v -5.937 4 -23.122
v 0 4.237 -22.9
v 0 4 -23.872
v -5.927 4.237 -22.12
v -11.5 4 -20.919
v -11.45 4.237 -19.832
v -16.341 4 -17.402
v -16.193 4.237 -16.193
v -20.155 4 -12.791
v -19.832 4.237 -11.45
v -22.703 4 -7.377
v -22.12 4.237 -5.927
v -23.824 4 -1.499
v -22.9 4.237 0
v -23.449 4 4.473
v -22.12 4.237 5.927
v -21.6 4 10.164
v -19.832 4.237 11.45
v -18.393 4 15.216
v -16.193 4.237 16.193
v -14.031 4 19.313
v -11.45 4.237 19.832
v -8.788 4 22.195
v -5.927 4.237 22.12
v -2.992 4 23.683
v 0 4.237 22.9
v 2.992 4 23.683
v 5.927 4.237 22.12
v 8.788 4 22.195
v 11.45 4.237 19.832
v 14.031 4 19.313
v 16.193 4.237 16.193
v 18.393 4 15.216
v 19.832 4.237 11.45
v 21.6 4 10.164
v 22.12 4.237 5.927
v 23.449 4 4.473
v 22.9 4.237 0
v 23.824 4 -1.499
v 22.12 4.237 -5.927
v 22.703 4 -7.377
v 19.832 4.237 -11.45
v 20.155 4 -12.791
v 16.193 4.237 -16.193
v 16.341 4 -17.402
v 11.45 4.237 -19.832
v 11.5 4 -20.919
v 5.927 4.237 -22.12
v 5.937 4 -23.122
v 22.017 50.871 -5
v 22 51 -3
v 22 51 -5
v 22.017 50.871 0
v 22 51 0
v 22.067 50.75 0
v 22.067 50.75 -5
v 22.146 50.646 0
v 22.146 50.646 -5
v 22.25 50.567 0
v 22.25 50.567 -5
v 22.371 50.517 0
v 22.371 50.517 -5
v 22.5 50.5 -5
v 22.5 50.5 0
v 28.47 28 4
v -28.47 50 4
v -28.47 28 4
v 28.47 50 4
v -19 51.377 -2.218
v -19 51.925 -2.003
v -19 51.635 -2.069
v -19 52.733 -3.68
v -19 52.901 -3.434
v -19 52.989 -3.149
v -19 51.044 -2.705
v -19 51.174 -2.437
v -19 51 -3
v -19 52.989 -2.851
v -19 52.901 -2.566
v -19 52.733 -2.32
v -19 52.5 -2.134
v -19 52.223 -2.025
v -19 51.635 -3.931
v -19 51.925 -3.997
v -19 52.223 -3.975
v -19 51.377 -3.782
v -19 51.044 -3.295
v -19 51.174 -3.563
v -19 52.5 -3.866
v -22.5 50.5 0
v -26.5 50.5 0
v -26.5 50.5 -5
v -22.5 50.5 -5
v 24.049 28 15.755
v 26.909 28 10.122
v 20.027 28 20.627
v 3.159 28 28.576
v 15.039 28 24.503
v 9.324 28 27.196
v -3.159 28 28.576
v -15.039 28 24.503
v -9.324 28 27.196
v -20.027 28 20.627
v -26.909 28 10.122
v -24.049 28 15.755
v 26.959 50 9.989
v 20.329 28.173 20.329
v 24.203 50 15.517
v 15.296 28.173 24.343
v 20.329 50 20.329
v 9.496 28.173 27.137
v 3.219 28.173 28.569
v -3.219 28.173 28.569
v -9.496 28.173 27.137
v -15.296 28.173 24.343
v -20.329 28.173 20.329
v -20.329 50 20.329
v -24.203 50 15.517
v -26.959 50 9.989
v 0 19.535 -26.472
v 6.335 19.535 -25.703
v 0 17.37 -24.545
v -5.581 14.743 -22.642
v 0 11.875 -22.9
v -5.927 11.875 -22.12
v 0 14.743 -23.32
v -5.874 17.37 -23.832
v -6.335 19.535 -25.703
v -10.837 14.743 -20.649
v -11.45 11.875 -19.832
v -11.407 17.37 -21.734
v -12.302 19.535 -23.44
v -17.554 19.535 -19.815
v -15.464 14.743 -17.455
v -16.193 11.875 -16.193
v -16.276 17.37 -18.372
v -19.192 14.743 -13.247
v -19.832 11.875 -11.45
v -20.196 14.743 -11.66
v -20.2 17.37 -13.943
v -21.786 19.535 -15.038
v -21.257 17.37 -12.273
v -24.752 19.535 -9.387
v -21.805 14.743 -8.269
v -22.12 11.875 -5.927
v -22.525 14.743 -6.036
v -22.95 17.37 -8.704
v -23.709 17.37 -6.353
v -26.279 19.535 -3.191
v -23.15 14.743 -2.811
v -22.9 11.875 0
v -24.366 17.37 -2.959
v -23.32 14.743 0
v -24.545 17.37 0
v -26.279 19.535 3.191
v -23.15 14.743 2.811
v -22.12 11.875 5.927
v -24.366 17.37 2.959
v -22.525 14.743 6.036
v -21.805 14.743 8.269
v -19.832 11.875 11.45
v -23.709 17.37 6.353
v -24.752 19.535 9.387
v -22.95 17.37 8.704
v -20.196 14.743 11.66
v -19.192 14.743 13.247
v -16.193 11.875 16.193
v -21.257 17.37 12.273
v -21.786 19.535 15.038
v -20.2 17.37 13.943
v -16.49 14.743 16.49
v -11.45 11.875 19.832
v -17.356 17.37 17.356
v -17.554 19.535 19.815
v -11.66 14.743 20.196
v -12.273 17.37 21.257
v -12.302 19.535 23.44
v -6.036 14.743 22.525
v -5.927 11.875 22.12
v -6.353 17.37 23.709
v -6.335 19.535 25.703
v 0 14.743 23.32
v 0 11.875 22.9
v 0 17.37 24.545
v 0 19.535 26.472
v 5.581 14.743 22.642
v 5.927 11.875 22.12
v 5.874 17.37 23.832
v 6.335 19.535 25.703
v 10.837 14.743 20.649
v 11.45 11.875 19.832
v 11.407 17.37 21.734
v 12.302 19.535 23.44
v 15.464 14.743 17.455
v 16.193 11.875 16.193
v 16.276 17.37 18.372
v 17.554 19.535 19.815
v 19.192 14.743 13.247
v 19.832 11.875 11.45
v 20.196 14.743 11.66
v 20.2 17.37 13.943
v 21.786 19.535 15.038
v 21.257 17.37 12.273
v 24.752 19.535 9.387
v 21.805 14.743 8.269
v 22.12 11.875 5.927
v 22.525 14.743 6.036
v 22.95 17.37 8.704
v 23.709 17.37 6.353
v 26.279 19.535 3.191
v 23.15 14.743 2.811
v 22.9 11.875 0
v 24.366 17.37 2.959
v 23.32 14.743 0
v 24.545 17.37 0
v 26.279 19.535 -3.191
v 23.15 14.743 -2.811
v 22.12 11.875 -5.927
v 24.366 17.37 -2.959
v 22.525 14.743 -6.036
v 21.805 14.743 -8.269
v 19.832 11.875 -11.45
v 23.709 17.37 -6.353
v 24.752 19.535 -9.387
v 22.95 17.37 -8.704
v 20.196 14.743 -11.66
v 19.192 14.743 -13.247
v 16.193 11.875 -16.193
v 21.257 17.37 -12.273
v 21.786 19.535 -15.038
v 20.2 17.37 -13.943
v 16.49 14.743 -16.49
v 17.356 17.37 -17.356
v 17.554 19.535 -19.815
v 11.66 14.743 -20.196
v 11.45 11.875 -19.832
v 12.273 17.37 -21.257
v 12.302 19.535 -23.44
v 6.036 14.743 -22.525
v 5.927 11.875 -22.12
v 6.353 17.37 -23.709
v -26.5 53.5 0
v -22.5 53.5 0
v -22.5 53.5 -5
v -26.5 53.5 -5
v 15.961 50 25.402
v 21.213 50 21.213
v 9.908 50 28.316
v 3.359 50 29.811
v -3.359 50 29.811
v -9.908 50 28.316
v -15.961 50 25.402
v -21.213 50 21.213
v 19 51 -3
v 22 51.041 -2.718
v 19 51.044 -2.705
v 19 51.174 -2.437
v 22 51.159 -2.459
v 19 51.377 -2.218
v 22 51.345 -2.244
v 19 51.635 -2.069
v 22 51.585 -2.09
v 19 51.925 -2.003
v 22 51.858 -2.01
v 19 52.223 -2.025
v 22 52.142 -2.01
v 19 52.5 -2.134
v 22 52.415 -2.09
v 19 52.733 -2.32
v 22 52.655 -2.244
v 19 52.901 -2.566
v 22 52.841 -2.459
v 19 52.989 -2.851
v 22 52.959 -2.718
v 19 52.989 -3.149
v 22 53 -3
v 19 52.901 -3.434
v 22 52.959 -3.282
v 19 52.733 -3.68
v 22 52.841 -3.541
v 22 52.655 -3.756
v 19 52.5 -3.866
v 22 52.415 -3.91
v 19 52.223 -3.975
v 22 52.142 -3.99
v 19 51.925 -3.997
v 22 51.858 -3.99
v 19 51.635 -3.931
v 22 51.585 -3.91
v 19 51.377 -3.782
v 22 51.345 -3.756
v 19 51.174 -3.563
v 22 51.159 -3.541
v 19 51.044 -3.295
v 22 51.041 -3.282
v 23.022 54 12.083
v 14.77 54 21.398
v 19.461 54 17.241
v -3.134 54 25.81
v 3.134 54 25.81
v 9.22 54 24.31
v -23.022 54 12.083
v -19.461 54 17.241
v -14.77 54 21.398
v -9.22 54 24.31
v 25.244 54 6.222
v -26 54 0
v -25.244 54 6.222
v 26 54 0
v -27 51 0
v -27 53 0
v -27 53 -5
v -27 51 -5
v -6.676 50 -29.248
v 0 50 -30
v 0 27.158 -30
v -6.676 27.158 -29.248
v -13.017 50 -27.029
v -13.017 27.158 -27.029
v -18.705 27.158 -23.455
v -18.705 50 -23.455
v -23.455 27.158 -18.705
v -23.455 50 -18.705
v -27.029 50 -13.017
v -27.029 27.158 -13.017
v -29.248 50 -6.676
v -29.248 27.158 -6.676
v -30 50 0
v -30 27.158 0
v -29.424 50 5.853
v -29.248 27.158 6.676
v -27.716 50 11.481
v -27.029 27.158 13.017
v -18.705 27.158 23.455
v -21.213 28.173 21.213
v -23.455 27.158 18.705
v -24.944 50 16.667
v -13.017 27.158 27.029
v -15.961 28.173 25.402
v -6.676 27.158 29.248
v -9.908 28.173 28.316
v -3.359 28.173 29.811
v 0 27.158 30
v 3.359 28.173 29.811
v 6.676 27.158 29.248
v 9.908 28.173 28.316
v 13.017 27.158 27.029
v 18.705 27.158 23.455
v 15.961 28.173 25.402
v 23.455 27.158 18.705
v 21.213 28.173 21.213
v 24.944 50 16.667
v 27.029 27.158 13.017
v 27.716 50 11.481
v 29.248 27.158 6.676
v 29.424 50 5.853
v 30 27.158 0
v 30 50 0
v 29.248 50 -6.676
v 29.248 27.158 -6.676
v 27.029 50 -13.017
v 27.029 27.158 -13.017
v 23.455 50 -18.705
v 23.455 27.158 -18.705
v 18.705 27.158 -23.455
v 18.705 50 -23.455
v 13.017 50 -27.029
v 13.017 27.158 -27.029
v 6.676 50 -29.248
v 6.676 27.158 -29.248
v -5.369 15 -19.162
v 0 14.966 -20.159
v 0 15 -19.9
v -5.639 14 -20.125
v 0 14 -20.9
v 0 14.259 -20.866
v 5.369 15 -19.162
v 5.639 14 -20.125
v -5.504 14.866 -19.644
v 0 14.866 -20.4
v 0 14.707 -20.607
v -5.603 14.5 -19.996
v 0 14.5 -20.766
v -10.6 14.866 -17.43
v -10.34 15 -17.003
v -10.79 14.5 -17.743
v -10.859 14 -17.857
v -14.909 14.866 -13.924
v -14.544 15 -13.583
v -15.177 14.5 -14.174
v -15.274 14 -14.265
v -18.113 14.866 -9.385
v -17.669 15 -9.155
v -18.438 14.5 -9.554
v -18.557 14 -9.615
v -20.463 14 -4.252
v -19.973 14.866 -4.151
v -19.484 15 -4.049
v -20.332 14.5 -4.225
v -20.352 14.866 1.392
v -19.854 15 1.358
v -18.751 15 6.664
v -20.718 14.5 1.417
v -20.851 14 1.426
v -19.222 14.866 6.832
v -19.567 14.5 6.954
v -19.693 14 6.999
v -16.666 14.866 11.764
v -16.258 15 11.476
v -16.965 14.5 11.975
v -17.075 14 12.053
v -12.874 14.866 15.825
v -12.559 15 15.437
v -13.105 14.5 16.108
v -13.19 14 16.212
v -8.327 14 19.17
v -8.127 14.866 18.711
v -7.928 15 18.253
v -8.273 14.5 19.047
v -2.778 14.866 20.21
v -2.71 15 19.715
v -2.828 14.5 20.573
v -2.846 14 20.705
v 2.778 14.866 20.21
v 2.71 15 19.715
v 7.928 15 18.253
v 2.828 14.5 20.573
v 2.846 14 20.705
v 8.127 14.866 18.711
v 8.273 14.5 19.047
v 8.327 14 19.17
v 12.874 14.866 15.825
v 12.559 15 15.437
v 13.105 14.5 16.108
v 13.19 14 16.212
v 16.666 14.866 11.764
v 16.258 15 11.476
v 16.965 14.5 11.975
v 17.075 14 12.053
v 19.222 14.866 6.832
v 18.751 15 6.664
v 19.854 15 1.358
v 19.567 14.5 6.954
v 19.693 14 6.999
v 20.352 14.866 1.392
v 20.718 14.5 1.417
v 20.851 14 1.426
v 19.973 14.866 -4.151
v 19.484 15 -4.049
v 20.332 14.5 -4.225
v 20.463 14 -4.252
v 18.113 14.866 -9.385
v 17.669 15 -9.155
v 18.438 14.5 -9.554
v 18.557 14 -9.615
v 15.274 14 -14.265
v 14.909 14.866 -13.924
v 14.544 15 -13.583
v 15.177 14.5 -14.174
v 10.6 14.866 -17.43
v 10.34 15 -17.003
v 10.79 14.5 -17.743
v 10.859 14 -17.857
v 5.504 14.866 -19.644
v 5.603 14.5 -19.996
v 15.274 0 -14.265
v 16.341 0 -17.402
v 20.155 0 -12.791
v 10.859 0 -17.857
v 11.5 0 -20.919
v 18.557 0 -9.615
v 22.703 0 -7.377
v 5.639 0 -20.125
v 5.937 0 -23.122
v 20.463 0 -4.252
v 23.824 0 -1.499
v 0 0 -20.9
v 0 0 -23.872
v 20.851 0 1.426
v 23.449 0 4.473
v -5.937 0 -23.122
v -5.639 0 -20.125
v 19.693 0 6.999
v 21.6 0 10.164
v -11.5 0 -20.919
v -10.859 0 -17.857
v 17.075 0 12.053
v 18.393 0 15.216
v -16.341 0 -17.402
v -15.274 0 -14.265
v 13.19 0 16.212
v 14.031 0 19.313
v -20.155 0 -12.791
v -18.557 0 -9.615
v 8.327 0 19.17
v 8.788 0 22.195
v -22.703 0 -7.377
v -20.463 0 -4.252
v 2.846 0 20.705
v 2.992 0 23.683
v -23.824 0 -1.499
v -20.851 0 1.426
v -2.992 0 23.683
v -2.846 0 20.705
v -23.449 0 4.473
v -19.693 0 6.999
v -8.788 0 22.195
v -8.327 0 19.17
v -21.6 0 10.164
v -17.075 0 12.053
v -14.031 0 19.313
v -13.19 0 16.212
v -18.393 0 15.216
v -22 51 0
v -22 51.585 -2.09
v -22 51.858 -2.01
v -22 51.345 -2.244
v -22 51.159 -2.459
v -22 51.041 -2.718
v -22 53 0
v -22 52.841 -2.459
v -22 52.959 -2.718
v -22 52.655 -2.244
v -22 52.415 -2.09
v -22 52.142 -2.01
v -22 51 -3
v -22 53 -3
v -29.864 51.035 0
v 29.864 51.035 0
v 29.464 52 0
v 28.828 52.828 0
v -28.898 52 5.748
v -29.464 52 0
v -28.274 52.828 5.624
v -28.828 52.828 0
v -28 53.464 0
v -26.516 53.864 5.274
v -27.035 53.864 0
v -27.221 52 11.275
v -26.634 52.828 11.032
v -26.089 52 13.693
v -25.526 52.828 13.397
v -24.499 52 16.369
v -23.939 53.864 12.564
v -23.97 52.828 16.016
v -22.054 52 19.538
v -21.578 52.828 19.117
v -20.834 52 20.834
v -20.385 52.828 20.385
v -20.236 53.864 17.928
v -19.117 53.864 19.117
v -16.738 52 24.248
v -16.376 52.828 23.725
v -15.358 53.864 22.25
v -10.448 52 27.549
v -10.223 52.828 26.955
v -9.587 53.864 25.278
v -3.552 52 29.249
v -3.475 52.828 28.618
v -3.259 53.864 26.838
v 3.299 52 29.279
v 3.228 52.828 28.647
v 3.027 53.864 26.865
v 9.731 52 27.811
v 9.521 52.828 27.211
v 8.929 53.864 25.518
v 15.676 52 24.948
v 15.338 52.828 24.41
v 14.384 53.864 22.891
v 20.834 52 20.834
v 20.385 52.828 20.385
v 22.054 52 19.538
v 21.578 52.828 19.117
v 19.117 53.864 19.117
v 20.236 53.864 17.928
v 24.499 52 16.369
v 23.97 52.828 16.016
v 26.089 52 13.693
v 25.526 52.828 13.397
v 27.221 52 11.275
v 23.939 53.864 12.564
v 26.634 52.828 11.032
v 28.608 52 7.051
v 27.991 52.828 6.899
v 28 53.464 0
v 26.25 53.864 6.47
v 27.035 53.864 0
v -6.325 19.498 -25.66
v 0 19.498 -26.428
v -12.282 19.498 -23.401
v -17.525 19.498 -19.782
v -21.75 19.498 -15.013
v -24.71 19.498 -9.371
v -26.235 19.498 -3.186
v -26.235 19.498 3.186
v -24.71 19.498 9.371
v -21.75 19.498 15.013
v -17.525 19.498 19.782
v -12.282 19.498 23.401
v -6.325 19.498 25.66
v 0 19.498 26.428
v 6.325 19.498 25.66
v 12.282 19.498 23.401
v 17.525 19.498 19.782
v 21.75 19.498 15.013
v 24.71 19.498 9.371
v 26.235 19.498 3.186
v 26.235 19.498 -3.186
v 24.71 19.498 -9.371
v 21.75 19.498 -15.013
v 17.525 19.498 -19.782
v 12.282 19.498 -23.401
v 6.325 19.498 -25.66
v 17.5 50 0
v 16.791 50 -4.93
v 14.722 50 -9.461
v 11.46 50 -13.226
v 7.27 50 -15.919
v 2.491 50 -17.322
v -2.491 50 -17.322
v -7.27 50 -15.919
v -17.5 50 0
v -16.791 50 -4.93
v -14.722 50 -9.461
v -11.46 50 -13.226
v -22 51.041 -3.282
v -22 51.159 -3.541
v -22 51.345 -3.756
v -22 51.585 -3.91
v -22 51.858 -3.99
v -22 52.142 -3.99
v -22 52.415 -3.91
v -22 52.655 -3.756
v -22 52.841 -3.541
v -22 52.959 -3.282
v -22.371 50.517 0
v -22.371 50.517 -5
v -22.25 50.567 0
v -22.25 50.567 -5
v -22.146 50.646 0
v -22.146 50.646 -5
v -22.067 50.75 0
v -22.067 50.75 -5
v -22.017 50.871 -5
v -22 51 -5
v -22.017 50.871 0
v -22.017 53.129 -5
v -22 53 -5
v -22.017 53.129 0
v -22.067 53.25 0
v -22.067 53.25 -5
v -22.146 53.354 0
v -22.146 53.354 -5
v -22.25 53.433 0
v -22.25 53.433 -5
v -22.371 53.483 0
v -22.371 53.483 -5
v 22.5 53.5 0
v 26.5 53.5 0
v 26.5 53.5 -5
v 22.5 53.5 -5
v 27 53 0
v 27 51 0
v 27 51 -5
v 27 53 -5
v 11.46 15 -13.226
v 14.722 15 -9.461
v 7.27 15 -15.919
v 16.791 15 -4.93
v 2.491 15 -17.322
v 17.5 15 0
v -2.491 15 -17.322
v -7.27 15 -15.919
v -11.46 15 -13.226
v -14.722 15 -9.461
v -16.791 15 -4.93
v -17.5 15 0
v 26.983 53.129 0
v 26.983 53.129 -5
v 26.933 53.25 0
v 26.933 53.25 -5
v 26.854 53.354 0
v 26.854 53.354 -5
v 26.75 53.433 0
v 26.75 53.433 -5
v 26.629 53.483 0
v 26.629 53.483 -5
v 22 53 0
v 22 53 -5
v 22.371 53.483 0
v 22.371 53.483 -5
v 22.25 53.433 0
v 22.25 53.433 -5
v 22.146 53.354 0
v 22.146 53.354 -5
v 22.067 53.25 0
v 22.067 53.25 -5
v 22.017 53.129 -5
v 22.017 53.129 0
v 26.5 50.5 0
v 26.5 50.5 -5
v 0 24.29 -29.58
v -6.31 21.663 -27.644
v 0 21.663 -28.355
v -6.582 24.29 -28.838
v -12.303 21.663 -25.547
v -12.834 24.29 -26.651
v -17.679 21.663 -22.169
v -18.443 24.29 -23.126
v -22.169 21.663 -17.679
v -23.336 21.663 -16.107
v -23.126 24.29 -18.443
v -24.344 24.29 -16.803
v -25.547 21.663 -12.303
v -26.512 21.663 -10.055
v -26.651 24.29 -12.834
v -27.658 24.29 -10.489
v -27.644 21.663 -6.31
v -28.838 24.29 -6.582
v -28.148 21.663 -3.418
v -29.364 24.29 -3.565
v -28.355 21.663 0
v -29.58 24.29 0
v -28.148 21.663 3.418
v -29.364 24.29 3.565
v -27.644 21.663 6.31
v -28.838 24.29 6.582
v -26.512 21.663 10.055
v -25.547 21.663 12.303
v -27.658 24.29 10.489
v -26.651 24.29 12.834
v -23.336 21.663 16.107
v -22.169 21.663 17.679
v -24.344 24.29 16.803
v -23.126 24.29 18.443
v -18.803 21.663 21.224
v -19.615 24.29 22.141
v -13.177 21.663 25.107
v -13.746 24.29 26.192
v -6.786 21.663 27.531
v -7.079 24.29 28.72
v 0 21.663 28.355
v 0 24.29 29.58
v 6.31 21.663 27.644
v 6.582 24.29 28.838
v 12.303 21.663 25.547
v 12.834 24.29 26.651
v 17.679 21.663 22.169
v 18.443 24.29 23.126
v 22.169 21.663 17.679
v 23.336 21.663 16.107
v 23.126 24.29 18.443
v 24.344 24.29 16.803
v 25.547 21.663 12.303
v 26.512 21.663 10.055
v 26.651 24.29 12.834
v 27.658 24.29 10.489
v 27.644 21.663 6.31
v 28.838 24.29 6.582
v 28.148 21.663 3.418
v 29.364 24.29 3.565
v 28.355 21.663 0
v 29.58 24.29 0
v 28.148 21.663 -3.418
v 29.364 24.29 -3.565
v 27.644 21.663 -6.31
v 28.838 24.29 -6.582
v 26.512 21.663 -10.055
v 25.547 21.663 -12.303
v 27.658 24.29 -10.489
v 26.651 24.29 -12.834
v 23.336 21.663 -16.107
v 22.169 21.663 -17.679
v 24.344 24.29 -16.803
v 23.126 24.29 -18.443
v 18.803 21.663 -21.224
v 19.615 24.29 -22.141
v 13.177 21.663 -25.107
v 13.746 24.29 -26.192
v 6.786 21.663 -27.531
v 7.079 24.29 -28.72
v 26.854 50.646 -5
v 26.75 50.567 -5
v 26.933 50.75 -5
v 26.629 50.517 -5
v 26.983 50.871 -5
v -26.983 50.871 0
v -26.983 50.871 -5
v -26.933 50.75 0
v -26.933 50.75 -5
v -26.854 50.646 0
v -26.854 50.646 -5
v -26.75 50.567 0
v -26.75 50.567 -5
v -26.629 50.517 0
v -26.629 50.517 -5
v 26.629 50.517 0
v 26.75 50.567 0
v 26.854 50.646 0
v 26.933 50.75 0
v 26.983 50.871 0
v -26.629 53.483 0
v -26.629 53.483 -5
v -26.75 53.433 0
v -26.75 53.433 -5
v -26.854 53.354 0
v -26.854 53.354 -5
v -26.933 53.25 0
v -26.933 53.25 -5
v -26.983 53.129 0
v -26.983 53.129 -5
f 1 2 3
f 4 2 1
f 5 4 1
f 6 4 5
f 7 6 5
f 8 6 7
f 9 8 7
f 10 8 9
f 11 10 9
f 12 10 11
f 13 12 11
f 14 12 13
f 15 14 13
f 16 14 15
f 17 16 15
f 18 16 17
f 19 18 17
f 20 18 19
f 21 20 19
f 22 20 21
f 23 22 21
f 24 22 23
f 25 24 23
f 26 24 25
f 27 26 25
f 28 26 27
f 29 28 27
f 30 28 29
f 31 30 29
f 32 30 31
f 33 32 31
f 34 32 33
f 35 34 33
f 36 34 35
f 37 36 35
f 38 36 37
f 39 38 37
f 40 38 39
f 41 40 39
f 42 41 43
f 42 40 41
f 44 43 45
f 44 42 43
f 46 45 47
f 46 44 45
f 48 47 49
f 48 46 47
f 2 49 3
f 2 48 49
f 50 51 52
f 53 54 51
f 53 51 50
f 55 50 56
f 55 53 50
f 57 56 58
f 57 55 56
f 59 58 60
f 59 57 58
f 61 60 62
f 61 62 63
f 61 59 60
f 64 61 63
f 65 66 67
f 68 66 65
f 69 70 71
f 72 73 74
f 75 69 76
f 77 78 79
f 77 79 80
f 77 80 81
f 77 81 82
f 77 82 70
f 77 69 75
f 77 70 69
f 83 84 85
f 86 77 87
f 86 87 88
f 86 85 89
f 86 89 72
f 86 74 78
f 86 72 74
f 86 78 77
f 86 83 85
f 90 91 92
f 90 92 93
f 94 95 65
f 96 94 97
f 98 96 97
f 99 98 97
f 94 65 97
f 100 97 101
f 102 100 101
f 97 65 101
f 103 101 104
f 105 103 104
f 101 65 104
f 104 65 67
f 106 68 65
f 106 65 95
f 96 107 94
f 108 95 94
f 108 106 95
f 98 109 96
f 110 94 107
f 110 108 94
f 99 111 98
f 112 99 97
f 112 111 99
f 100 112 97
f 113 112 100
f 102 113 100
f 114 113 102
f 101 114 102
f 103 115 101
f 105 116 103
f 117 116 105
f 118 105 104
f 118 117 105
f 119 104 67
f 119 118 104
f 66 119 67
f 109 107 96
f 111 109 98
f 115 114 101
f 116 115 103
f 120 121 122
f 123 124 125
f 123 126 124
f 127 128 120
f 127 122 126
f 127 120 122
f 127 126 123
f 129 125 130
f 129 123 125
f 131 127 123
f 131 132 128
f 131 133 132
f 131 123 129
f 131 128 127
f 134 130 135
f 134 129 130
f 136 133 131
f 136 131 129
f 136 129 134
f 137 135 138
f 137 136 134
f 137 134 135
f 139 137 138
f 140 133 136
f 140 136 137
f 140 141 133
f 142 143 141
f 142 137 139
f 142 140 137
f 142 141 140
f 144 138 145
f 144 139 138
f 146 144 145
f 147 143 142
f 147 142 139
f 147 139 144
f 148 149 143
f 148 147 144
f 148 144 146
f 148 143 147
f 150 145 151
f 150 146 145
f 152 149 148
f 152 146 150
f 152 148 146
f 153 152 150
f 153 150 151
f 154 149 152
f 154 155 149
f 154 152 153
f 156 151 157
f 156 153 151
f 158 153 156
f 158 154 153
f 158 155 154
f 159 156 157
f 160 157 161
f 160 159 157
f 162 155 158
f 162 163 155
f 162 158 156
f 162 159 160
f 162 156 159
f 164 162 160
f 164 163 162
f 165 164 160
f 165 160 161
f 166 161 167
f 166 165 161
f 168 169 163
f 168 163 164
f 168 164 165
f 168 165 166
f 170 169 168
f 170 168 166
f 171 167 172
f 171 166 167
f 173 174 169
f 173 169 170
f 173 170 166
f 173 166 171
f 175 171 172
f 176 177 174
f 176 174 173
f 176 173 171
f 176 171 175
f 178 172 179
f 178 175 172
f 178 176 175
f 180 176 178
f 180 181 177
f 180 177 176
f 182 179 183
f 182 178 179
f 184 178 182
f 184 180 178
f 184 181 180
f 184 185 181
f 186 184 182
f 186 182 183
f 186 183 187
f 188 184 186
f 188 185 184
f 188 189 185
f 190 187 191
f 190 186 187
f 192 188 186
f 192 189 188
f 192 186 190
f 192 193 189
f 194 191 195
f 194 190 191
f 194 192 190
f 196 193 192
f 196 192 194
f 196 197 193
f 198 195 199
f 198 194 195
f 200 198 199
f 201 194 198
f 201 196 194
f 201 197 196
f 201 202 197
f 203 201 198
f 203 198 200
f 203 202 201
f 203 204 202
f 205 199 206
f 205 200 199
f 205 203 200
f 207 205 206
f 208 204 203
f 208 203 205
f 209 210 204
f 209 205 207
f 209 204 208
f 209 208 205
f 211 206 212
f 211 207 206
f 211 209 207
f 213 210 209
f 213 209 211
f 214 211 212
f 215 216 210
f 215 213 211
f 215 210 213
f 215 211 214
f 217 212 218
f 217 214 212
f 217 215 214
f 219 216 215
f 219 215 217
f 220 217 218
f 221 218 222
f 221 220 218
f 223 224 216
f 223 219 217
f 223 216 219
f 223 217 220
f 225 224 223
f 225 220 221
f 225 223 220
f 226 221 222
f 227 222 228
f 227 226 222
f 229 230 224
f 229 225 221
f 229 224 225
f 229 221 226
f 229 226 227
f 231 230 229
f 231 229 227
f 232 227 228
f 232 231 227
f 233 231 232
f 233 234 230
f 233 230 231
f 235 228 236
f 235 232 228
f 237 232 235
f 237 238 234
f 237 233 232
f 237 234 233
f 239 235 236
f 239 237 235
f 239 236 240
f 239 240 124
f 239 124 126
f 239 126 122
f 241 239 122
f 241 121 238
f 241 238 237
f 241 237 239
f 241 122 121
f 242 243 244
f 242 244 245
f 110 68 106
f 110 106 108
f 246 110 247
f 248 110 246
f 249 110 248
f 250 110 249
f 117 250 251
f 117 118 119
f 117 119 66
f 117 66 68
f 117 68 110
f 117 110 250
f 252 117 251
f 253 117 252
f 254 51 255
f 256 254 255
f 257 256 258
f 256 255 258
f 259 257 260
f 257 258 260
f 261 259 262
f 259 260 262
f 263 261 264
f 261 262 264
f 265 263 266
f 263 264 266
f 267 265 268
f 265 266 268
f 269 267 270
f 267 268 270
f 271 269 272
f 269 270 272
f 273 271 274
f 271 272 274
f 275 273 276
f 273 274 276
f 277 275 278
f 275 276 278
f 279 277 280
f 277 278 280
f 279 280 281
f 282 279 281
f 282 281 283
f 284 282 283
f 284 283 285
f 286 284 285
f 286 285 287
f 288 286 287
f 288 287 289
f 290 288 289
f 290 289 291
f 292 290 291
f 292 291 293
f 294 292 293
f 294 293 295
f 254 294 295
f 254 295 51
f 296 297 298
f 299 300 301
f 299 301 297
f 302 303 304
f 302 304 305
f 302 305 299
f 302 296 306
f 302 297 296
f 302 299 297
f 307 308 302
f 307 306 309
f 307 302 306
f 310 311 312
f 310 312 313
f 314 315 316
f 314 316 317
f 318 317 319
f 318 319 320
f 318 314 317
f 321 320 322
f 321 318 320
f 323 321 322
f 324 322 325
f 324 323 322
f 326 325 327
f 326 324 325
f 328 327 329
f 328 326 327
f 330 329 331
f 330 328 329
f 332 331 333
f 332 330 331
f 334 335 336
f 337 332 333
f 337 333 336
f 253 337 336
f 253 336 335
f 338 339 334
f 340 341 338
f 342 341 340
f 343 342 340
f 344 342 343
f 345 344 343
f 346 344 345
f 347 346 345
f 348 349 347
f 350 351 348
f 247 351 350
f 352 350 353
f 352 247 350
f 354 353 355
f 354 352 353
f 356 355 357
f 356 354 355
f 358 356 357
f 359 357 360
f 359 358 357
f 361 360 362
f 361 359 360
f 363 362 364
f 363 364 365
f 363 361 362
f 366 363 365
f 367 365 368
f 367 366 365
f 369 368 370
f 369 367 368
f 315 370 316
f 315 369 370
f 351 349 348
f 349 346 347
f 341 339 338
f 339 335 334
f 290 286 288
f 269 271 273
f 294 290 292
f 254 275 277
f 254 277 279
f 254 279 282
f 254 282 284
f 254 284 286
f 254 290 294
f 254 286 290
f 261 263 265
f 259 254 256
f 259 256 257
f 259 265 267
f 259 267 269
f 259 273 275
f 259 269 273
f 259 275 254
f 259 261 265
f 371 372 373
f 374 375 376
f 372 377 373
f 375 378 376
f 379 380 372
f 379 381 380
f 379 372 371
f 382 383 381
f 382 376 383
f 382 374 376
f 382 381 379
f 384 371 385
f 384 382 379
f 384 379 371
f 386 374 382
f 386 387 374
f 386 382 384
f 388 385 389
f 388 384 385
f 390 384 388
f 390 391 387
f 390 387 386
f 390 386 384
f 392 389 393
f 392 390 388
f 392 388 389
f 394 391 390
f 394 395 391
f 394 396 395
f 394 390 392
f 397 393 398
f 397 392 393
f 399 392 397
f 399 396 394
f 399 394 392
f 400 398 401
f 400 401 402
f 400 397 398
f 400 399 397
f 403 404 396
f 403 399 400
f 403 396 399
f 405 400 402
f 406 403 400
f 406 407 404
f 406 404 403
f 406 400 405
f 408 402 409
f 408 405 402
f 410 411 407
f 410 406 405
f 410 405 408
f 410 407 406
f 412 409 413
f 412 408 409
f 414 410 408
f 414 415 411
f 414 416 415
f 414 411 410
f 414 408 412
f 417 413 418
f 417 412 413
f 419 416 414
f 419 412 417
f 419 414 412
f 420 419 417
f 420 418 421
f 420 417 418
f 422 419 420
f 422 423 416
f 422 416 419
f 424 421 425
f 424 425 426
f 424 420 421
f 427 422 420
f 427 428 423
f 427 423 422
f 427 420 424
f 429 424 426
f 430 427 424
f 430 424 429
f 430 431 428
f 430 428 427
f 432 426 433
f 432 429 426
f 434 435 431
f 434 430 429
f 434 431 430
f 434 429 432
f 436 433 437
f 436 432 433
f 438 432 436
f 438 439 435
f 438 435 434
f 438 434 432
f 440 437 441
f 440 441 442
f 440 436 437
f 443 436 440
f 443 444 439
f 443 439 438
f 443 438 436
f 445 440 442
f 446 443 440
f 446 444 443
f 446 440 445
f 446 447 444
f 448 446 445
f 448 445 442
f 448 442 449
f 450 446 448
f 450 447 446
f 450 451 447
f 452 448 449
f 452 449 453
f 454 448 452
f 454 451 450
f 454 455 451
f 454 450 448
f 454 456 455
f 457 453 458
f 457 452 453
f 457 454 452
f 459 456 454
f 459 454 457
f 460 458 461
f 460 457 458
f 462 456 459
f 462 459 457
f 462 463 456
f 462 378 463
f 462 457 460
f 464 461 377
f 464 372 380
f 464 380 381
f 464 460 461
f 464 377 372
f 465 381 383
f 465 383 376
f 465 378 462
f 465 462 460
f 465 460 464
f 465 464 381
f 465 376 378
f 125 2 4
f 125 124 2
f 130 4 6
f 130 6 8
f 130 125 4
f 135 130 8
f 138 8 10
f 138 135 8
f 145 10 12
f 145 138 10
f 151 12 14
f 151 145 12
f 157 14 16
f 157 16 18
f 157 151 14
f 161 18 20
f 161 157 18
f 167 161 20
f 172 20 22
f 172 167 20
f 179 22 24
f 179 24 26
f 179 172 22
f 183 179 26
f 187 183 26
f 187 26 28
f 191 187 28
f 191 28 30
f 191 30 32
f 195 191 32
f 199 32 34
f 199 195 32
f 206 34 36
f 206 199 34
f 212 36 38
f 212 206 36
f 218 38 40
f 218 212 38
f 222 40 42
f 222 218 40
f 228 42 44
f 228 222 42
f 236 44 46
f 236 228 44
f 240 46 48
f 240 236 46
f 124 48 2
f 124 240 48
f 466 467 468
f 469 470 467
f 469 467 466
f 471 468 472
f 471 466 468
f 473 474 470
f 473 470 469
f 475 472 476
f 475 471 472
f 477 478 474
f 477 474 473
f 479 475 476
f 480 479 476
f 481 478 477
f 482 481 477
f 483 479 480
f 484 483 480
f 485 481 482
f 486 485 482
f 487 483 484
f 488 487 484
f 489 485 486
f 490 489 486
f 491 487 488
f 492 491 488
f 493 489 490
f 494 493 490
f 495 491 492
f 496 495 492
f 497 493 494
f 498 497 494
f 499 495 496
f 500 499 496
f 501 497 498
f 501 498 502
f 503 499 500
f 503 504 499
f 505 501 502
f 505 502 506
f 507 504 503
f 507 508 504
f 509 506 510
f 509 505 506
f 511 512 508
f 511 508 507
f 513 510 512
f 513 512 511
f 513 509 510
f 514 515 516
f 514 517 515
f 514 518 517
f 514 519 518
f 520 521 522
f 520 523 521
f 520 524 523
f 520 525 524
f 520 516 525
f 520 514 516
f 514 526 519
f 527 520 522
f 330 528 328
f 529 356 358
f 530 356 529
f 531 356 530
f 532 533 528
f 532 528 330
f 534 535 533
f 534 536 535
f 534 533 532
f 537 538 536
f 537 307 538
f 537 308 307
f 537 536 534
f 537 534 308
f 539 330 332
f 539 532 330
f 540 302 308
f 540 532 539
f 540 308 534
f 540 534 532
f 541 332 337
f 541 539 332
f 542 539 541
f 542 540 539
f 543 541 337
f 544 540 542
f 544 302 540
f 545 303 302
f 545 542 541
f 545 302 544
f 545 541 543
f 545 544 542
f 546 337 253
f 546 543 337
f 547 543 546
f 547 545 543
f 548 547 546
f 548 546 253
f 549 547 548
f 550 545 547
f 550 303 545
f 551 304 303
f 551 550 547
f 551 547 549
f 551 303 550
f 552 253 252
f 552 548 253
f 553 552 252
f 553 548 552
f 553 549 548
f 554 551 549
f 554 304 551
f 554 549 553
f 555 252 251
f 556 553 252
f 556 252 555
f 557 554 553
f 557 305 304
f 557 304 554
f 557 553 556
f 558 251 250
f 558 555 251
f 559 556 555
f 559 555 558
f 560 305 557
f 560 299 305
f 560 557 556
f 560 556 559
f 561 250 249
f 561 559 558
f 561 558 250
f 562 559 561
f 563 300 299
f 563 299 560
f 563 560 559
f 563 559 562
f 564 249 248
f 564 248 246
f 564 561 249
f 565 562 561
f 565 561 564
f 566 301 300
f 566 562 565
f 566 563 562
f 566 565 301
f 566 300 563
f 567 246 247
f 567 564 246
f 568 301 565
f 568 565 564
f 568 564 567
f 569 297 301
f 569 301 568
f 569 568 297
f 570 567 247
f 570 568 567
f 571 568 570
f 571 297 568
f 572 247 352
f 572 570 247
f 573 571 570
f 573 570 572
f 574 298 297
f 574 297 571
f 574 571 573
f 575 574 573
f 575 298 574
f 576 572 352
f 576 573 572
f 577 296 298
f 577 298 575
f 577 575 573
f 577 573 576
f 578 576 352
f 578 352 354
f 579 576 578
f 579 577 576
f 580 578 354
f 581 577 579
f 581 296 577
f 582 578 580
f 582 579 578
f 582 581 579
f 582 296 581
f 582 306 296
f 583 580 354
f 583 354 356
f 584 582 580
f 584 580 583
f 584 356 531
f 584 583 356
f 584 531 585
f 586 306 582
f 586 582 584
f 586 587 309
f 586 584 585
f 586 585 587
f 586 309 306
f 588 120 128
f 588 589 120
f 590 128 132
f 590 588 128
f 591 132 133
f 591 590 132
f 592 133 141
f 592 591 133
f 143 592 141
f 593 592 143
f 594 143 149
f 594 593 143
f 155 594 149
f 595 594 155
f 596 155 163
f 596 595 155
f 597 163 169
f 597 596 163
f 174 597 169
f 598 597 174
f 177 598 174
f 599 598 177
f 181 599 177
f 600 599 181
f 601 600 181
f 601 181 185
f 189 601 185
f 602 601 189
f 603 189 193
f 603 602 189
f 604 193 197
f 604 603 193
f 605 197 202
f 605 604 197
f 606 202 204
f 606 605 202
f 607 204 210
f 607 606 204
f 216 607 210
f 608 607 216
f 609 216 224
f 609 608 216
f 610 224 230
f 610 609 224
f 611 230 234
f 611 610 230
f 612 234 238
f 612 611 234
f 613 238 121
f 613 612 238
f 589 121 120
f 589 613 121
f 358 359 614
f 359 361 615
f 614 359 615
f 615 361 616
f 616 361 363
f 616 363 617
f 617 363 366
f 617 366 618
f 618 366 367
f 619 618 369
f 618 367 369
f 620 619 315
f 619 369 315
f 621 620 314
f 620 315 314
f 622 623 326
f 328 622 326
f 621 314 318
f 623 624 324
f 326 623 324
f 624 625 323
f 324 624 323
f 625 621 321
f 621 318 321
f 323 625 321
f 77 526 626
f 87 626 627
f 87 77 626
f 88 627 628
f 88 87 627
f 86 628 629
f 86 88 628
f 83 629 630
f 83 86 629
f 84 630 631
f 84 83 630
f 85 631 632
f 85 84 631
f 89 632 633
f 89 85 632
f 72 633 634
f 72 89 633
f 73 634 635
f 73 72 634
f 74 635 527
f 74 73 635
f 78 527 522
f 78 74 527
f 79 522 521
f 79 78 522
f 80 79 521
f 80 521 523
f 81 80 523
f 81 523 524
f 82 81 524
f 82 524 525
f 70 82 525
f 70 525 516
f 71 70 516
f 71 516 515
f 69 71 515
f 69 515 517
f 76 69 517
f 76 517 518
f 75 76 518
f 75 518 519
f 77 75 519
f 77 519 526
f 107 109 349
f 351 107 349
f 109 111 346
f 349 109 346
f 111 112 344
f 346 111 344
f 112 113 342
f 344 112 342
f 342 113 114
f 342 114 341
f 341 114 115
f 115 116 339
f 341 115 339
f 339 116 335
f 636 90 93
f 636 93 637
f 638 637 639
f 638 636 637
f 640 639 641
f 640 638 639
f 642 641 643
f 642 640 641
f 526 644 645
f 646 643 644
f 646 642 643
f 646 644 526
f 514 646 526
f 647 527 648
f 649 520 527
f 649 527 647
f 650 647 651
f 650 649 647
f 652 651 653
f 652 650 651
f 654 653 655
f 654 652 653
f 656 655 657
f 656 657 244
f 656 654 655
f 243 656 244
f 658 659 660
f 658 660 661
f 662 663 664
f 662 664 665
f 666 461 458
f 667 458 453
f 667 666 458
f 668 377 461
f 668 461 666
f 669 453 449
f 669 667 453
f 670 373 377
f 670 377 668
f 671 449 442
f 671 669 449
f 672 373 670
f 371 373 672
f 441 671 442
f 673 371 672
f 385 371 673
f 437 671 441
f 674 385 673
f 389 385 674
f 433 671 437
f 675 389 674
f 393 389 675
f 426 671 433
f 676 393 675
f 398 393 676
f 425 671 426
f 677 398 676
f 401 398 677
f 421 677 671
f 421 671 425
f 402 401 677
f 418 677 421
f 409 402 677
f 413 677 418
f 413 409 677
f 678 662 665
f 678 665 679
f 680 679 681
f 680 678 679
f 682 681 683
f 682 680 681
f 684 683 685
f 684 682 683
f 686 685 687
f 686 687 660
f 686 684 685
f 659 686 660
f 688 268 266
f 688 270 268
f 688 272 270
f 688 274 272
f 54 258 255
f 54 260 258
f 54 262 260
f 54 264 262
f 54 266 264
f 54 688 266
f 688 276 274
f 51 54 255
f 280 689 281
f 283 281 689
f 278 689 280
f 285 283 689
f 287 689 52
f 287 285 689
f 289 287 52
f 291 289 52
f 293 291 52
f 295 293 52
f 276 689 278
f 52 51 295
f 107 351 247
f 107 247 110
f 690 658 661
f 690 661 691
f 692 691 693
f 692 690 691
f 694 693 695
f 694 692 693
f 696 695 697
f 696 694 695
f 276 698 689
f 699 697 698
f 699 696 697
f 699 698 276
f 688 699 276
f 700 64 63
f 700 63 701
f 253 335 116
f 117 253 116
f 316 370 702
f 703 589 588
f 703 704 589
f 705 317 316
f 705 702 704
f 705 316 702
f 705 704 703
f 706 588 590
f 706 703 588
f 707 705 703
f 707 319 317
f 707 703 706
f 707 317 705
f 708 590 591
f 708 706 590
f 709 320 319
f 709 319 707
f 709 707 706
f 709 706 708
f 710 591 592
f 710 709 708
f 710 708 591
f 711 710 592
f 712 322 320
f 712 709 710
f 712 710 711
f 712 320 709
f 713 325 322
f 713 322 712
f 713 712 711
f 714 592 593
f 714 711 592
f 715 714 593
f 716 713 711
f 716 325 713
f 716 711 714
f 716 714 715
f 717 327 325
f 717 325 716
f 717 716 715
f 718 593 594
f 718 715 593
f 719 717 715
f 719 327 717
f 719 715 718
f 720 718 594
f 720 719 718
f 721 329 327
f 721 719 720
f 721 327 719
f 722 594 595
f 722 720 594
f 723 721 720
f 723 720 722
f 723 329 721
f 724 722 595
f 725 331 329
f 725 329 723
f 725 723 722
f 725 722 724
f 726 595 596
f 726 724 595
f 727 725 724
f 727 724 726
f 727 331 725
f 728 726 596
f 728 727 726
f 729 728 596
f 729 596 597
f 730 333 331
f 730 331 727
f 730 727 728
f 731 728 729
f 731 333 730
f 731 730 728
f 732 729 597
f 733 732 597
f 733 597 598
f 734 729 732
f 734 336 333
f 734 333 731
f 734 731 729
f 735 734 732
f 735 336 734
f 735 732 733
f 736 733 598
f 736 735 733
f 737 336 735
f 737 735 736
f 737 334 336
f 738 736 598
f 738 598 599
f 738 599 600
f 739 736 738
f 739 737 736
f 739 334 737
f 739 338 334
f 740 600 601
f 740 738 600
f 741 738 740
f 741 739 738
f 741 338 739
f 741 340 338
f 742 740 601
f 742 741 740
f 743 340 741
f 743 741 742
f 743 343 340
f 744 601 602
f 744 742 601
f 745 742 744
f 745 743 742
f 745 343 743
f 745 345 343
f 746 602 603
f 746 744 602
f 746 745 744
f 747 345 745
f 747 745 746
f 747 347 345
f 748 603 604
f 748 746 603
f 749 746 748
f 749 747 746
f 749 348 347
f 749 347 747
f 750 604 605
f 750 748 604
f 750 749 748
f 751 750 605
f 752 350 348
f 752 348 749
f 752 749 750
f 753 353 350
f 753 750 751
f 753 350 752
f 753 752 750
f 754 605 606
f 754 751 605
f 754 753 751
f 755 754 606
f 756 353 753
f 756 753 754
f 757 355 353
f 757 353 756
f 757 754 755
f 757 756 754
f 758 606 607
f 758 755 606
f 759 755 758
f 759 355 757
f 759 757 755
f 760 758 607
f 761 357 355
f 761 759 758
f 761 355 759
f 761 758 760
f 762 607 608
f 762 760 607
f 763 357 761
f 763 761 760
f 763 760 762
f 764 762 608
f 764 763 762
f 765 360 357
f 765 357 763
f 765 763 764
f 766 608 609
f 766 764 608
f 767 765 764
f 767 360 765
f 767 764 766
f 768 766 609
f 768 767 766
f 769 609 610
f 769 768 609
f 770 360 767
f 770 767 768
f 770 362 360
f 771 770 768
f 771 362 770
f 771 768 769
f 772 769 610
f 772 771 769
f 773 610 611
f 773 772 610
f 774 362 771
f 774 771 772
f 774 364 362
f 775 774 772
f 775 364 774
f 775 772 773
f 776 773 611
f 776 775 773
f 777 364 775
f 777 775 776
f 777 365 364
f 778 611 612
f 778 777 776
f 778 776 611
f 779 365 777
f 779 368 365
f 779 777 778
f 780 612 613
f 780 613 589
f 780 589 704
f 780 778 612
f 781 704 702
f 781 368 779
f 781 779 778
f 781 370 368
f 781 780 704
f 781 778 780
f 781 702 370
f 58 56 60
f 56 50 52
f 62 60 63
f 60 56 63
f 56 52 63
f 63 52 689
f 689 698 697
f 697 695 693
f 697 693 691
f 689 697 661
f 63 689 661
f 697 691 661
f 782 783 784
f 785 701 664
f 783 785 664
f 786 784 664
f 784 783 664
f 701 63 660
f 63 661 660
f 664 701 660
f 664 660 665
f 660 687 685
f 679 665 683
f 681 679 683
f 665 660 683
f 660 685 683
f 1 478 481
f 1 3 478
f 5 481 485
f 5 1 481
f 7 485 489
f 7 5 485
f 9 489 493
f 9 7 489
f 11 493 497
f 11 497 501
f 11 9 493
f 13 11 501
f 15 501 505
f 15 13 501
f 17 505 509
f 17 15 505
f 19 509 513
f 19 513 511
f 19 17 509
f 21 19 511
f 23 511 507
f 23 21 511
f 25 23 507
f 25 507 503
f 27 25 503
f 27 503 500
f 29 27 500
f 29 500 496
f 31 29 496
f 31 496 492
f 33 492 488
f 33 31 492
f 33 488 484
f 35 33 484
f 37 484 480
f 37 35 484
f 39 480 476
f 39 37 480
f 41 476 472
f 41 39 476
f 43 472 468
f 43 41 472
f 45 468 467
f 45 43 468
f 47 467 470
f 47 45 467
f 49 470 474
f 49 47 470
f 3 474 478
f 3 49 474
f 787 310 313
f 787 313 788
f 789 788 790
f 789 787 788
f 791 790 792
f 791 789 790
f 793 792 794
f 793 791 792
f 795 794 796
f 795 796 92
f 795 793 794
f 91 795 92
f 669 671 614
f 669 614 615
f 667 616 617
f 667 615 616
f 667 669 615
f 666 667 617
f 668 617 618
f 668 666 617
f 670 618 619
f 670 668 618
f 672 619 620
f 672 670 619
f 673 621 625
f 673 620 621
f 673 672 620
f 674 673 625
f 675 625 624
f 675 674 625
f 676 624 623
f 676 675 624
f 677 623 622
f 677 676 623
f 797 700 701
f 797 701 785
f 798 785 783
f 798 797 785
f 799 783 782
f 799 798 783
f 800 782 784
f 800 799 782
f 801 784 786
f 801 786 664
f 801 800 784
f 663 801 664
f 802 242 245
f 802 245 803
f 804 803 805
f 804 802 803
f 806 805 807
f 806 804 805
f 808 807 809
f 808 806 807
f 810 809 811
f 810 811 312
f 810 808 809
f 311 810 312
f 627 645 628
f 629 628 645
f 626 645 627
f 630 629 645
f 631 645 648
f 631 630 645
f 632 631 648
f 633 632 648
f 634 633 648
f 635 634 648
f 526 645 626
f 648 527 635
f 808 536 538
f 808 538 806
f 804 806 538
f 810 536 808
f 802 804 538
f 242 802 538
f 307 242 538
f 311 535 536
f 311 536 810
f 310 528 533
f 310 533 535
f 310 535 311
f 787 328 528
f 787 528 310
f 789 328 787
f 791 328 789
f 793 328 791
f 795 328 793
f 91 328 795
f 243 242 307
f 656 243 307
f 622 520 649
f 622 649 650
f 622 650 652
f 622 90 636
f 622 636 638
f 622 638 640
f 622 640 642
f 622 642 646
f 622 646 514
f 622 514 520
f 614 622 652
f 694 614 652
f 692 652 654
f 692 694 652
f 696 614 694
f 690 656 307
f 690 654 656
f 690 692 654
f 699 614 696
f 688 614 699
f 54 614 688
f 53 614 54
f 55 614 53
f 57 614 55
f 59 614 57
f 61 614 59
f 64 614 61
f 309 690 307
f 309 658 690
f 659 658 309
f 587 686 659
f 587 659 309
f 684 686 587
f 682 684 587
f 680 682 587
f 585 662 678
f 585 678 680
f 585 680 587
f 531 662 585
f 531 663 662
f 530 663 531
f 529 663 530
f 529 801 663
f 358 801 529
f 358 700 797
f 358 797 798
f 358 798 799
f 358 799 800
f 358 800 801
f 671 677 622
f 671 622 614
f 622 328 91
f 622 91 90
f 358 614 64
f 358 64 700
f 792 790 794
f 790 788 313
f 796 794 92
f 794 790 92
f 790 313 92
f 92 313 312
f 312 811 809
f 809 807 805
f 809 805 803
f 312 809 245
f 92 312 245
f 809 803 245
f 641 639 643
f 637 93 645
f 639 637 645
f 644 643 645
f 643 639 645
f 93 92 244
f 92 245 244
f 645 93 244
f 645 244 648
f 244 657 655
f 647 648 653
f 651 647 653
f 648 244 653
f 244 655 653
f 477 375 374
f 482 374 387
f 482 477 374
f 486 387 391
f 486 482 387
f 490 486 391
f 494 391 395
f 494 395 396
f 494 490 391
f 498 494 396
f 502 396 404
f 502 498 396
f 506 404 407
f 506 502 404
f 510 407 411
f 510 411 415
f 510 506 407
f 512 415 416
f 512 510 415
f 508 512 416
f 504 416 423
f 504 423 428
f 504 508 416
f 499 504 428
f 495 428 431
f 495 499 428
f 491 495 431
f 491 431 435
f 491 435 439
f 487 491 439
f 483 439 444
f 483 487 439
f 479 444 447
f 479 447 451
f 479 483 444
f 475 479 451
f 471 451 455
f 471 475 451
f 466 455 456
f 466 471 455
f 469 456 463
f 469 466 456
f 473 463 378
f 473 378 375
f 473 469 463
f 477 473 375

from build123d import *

# Parameters (mm, degrees)
CUT_EXTRUDE3_DEPTH           = 45
CUT_EXTRUDE3_DEPTH_BACK      = 20
CUT_EXTRUDE5_START           = -5
CUT_EXTRUDE5_DEPTH           = 5
BOSS_EXTRUDE2_DEPTH          = 5
SKETCH14_R                   = 1
BOSS_EXTRUDE3_DEPTH          = 3
BOSS_EXTRUDE4_START          = 3
SKETCH15_R                   = 1
BOSS_EXTRUDE4_DEPTH          = 3
CUT_EXTRUDE6_DEPTH           = 22
SKETCH18_W                   = 1.5
SKETCH18_H                   = 21.826980301
CUT_REVOLVE1_ANGLE           = 45
CUT_REVOLVE1_OTHER_WAY_ANGLE = 45


with BuildPart() as part:
    # Sketch1 → Revolve1 (revolve)
    with BuildSketch(Plane.XY, mode=Mode.PRIVATE) as revolve1_sk:
        with BuildLine():
            Line((20.9, 0), (23.871591838, 0))
            Line((23.871591838, 0), (23.871591838, 4))
            Line((23.871591838, 4), (22.9, 4.236662843))
            Line((22.9, 4.236662843), (22.9, 11.874576818))
            ThreePointArc((22.9, 11.874576818), (23.83692213, 16.100759435), (26.472123903, 19.535021249))
            Line((26.472123903, 19.535021249), (26.427876097, 19.497892931))
            ThreePointArc((26.427876097, 19.497892931), (29.06307787, 22.932154745), (30, 27.158337362))
            Line((30, 27.158337362), (30, 50))
            ThreePointArc((30, 50), (28.828427125, 52.828427125), (26, 54))
            Line((26, 54), (0, 54))
            Line((0, 54), (0, 15))
            Line((0, 15), (19.9, 15))
            ThreePointArc((19.9, 15), (20.607106781, 14.707106781), (20.9, 14))
            Line((20.9, 14), (20.9, 0))
        make_face()
    revolve(revolve1_sk.sketch.rotate(Axis((0, 0, 0), (0, 1, 0)), 90), axis=Axis((0, 0, 0), (0, 1, 0)))

    # Sketch11 → Cut-Extrude3 (cut, two sides: drawn at the far end of the back side and taken through both)
    with BuildSketch(Plane(origin=(0, 17, 0), x_dir=(1, 0, 0), z_dir=(0, 1, 0)).offset(-CUT_EXTRUDE3_DEPTH_BACK)):
        with BuildLine():
            Line((-17.5, 0), (17.5, 0))
            ThreePointArc((17.5, 0), (0, 17.5), (-17.5, 0))
        make_face()
    extrude(amount=CUT_EXTRUDE3_DEPTH + CUT_EXTRUDE3_DEPTH_BACK, mode=Mode.SUBTRACT)

    # Sketch9 → Cut-Extrude5 (cut)
    with BuildSketch(Plane(origin=(0, 50, 0), x_dir=(-1, 0, 0), z_dir=(0, -1, 0)).offset(CUT_EXTRUDE5_START)):
        with BuildLine():
            Line((-30, 0), (30, 0))
            ThreePointArc((30, 0), (0, 30), (-30, 0))
        make_face()
    extrude(amount=CUT_EXTRUDE5_DEPTH, mode=Mode.SUBTRACT)

    # Sketch13 → Boss-Extrude2 (add)
    with BuildSketch(Plane(origin=(0, 0, 0), x_dir=(-1, 0, 0), z_dir=(0, 0, -1))):
        with BuildLine():
            Line((22.5, 53.5), (26.5, 53.5))
            ThreePointArc((26.5, 53.5), (26.853553391, 53.353553391), (27, 53))
            Line((27, 53), (27, 51))
            ThreePointArc((27, 51), (26.853553391, 50.646446609), (26.5, 50.5))
            Line((26.5, 50.5), (22.5, 50.5))
            ThreePointArc((22.5, 50.5), (22.146446609, 50.646446609), (22, 51))
            Line((22, 51), (22, 53))
            ThreePointArc((22, 53), (22.146446609, 53.353553391), (22.5, 53.5))
        make_face()
        with BuildLine():
            Line((-26.5, 53.5), (-22.5, 53.5))
            ThreePointArc((-22.5, 53.5), (-22.146446609, 53.353553391), (-22, 53))
            Line((-22, 53), (-22, 51))
            ThreePointArc((-22, 51), (-22.146446609, 50.646446609), (-22.5, 50.5))
            Line((-22.5, 50.5), (-26.5, 50.5))
            ThreePointArc((-26.5, 50.5), (-26.853553391, 50.646446609), (-27, 51))
            Line((-27, 51), (-27, 53))
            ThreePointArc((-27, 53), (-26.853553391, 53.353553391), (-26.5, 53.5))
        make_face()
    extrude(amount=BOSS_EXTRUDE2_DEPTH)

    # Sketch14 → Boss-Extrude3 (add)
    with BuildSketch(Plane.ZY.offset(-22)):
        with Locations(Location((-3, 52, 0), (0, 0, 270))):
            Circle(SKETCH14_R)
    extrude(amount=BOSS_EXTRUDE3_DEPTH)

    # Sketch15 → Boss-Extrude4 (add)
    with BuildSketch(Plane(origin=(-22, 0, 0), x_dir=(0, 0, -1), z_dir=(1, 0, 0)).offset(BOSS_EXTRUDE4_START)):
        with Locations(Location((3, 52, 0), (0, 0, 270))):
            Circle(SKETCH15_R)
    extrude(amount=-BOSS_EXTRUDE4_DEPTH)

    # Sketch16 → Cut-Extrude6 (cut)
    with BuildSketch(Plane(origin=(0, 50, 0), x_dir=(-1, 0, 0), z_dir=(0, -1, 0))):
        with BuildLine():
            Line((28.470379344, -4), (-28.470379344, -4))
            ThreePointArc((-28.470379344, -4), (0, -28.75), (28.470379344, -4))
        make_face()
    extrude(amount=CUT_EXTRUDE6_DEPTH, mode=Mode.SUBTRACT)

    # Sketch18 → Cut-Revolve1 (revolve, cut)
    with BuildSketch(Plane(origin=(0, 0, 0), x_dir=(0, 0, -1), z_dir=(1, 0, 0))):
        with Locations((-29.25, 39.08650985)):
            Rectangle(SKETCH18_W, SKETCH18_H)
    revolve(axis=Axis((0, 0, 0), (0, 1, 0)), revolution_arc=CUT_REVOLVE1_ANGLE, mode=Mode.SUBTRACT)

    # Sketch18 → Cut-Revolve1 other way (revolve, cut)
    with BuildSketch(Plane(origin=(0, 0, 0), x_dir=(0, 0, -1), z_dir=(1, 0, 0))):
        with Locations((-29.25, 39.08650985)):
            Rectangle(SKETCH18_W, SKETCH18_H)
    revolve(axis=Axis((0, 0, 0), (0, -1, 0)), revolution_arc=CUT_REVOLVE1_OTHER_WAY_ANGLE, mode=Mode.SUBTRACT)


solid = part.part
